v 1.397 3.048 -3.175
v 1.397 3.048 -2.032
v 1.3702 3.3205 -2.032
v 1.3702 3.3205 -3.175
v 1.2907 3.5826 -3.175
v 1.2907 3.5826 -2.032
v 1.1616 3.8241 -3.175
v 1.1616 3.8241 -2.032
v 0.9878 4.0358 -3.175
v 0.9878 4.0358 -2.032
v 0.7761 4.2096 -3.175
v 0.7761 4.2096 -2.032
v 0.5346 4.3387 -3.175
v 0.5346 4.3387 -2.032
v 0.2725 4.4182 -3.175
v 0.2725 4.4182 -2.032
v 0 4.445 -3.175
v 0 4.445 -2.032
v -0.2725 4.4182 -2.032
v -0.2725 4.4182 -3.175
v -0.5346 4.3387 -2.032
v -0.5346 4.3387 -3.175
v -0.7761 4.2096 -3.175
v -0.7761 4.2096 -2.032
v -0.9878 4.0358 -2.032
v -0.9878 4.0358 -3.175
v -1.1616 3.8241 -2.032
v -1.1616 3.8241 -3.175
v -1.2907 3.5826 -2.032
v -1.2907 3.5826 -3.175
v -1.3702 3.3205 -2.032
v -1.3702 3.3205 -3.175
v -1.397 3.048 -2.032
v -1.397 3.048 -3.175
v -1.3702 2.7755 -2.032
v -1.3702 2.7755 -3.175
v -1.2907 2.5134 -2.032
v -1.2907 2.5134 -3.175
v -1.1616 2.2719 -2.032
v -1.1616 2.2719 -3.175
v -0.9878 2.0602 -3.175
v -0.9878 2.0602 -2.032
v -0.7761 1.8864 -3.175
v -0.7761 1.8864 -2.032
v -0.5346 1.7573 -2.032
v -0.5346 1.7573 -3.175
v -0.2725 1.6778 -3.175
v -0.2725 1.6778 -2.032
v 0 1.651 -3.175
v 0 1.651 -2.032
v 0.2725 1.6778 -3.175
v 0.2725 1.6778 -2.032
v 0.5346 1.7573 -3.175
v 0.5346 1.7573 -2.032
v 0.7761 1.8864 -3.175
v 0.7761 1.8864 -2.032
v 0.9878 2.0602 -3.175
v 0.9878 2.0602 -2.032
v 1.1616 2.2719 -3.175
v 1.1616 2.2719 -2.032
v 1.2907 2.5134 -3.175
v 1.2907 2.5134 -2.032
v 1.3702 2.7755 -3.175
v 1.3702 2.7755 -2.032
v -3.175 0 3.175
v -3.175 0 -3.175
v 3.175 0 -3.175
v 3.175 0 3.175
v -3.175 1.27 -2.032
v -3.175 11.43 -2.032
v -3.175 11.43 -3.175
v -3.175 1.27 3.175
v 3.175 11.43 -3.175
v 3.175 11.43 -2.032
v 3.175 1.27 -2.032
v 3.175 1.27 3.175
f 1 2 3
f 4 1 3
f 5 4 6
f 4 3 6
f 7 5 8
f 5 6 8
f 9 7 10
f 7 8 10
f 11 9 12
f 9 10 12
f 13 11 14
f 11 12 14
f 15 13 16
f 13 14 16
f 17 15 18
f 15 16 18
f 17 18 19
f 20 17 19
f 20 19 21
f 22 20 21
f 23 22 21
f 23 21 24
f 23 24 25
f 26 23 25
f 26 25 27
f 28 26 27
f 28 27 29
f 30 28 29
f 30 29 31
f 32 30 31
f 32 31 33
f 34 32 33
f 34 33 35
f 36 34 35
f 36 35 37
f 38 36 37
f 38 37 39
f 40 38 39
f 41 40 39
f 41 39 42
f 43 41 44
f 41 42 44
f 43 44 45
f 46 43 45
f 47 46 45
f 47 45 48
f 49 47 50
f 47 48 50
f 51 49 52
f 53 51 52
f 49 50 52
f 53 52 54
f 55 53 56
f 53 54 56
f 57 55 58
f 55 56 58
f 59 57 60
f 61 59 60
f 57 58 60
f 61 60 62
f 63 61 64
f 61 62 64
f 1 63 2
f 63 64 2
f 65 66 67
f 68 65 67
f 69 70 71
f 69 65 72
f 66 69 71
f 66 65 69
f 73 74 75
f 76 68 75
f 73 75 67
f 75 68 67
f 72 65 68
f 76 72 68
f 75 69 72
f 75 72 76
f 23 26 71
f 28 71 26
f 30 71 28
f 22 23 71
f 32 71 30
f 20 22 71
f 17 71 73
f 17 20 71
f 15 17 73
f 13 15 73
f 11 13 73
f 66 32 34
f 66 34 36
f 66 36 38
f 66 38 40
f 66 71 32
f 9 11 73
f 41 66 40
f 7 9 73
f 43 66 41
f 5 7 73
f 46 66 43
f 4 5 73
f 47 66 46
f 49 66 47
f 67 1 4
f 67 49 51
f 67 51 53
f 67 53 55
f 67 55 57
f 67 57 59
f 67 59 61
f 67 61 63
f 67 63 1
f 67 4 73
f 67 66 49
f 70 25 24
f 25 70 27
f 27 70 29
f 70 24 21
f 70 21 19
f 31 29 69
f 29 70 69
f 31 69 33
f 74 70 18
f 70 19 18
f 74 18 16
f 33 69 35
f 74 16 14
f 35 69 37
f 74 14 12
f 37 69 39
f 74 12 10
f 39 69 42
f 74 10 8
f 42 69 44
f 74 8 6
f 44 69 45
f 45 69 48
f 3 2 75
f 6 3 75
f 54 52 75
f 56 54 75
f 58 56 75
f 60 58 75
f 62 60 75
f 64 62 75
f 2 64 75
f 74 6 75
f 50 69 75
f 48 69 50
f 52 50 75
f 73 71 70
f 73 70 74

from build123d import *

# Parameters (mm, degrees)
SKETCH1_W           = 6.35
SKETCH1_H           = 6.35
BOSS_EXTRUDE1_DEPTH = 1.27
SKETCH2_W           = 6.35
SKETCH2_H           = 1.143
BOSS_EXTRUDE2_DEPTH = 10.16
CUT_EXTRUDE1_REACH  = 3.143
SKETCH4_R           = 1.397


with BuildPart() as part:
    # Sketch1 → Boss-Extrude1 (new body)
    with BuildSketch(Plane(origin=(0, 0, 0), x_dir=(1, 0, 0), z_dir=(0, 1, 0))):
        Rectangle(SKETCH1_W, SKETCH1_H)
    extrude(amount=BOSS_EXTRUDE1_DEPTH)

    # Sketch2 → Boss-Extrude2 (add)
    with BuildSketch(Plane(origin=(0, 1.27, 0), x_dir=(1, 0, 0), z_dir=(0, 1, 0))):
        with Locations((0, 2.6035)):
            Rectangle(SKETCH2_W, SKETCH2_H)
    extrude(amount=BOSS_EXTRUDE2_DEPTH)

    # Sketch4 → Cut-Extrude1 (cut, up to next)
    with BuildSketch(Plane.XY.offset(-2.032), mode=Mode.PRIVATE) as cut_extrude1_sk1:
        with Locations((0, 3.048)):
            Circle(SKETCH4_R)
    cut_extrude1_tool1 = extrude(cut_extrude1_sk1.sketch, amount=-CUT_EXTRUDE1_REACH, mode=Mode.PRIVATE) & part.part
    add(cut_extrude1_tool1.solids().sort_by_distance((0, 3.048, -2.032))[0], mode=Mode.SUBTRACT)


solid = part.part
